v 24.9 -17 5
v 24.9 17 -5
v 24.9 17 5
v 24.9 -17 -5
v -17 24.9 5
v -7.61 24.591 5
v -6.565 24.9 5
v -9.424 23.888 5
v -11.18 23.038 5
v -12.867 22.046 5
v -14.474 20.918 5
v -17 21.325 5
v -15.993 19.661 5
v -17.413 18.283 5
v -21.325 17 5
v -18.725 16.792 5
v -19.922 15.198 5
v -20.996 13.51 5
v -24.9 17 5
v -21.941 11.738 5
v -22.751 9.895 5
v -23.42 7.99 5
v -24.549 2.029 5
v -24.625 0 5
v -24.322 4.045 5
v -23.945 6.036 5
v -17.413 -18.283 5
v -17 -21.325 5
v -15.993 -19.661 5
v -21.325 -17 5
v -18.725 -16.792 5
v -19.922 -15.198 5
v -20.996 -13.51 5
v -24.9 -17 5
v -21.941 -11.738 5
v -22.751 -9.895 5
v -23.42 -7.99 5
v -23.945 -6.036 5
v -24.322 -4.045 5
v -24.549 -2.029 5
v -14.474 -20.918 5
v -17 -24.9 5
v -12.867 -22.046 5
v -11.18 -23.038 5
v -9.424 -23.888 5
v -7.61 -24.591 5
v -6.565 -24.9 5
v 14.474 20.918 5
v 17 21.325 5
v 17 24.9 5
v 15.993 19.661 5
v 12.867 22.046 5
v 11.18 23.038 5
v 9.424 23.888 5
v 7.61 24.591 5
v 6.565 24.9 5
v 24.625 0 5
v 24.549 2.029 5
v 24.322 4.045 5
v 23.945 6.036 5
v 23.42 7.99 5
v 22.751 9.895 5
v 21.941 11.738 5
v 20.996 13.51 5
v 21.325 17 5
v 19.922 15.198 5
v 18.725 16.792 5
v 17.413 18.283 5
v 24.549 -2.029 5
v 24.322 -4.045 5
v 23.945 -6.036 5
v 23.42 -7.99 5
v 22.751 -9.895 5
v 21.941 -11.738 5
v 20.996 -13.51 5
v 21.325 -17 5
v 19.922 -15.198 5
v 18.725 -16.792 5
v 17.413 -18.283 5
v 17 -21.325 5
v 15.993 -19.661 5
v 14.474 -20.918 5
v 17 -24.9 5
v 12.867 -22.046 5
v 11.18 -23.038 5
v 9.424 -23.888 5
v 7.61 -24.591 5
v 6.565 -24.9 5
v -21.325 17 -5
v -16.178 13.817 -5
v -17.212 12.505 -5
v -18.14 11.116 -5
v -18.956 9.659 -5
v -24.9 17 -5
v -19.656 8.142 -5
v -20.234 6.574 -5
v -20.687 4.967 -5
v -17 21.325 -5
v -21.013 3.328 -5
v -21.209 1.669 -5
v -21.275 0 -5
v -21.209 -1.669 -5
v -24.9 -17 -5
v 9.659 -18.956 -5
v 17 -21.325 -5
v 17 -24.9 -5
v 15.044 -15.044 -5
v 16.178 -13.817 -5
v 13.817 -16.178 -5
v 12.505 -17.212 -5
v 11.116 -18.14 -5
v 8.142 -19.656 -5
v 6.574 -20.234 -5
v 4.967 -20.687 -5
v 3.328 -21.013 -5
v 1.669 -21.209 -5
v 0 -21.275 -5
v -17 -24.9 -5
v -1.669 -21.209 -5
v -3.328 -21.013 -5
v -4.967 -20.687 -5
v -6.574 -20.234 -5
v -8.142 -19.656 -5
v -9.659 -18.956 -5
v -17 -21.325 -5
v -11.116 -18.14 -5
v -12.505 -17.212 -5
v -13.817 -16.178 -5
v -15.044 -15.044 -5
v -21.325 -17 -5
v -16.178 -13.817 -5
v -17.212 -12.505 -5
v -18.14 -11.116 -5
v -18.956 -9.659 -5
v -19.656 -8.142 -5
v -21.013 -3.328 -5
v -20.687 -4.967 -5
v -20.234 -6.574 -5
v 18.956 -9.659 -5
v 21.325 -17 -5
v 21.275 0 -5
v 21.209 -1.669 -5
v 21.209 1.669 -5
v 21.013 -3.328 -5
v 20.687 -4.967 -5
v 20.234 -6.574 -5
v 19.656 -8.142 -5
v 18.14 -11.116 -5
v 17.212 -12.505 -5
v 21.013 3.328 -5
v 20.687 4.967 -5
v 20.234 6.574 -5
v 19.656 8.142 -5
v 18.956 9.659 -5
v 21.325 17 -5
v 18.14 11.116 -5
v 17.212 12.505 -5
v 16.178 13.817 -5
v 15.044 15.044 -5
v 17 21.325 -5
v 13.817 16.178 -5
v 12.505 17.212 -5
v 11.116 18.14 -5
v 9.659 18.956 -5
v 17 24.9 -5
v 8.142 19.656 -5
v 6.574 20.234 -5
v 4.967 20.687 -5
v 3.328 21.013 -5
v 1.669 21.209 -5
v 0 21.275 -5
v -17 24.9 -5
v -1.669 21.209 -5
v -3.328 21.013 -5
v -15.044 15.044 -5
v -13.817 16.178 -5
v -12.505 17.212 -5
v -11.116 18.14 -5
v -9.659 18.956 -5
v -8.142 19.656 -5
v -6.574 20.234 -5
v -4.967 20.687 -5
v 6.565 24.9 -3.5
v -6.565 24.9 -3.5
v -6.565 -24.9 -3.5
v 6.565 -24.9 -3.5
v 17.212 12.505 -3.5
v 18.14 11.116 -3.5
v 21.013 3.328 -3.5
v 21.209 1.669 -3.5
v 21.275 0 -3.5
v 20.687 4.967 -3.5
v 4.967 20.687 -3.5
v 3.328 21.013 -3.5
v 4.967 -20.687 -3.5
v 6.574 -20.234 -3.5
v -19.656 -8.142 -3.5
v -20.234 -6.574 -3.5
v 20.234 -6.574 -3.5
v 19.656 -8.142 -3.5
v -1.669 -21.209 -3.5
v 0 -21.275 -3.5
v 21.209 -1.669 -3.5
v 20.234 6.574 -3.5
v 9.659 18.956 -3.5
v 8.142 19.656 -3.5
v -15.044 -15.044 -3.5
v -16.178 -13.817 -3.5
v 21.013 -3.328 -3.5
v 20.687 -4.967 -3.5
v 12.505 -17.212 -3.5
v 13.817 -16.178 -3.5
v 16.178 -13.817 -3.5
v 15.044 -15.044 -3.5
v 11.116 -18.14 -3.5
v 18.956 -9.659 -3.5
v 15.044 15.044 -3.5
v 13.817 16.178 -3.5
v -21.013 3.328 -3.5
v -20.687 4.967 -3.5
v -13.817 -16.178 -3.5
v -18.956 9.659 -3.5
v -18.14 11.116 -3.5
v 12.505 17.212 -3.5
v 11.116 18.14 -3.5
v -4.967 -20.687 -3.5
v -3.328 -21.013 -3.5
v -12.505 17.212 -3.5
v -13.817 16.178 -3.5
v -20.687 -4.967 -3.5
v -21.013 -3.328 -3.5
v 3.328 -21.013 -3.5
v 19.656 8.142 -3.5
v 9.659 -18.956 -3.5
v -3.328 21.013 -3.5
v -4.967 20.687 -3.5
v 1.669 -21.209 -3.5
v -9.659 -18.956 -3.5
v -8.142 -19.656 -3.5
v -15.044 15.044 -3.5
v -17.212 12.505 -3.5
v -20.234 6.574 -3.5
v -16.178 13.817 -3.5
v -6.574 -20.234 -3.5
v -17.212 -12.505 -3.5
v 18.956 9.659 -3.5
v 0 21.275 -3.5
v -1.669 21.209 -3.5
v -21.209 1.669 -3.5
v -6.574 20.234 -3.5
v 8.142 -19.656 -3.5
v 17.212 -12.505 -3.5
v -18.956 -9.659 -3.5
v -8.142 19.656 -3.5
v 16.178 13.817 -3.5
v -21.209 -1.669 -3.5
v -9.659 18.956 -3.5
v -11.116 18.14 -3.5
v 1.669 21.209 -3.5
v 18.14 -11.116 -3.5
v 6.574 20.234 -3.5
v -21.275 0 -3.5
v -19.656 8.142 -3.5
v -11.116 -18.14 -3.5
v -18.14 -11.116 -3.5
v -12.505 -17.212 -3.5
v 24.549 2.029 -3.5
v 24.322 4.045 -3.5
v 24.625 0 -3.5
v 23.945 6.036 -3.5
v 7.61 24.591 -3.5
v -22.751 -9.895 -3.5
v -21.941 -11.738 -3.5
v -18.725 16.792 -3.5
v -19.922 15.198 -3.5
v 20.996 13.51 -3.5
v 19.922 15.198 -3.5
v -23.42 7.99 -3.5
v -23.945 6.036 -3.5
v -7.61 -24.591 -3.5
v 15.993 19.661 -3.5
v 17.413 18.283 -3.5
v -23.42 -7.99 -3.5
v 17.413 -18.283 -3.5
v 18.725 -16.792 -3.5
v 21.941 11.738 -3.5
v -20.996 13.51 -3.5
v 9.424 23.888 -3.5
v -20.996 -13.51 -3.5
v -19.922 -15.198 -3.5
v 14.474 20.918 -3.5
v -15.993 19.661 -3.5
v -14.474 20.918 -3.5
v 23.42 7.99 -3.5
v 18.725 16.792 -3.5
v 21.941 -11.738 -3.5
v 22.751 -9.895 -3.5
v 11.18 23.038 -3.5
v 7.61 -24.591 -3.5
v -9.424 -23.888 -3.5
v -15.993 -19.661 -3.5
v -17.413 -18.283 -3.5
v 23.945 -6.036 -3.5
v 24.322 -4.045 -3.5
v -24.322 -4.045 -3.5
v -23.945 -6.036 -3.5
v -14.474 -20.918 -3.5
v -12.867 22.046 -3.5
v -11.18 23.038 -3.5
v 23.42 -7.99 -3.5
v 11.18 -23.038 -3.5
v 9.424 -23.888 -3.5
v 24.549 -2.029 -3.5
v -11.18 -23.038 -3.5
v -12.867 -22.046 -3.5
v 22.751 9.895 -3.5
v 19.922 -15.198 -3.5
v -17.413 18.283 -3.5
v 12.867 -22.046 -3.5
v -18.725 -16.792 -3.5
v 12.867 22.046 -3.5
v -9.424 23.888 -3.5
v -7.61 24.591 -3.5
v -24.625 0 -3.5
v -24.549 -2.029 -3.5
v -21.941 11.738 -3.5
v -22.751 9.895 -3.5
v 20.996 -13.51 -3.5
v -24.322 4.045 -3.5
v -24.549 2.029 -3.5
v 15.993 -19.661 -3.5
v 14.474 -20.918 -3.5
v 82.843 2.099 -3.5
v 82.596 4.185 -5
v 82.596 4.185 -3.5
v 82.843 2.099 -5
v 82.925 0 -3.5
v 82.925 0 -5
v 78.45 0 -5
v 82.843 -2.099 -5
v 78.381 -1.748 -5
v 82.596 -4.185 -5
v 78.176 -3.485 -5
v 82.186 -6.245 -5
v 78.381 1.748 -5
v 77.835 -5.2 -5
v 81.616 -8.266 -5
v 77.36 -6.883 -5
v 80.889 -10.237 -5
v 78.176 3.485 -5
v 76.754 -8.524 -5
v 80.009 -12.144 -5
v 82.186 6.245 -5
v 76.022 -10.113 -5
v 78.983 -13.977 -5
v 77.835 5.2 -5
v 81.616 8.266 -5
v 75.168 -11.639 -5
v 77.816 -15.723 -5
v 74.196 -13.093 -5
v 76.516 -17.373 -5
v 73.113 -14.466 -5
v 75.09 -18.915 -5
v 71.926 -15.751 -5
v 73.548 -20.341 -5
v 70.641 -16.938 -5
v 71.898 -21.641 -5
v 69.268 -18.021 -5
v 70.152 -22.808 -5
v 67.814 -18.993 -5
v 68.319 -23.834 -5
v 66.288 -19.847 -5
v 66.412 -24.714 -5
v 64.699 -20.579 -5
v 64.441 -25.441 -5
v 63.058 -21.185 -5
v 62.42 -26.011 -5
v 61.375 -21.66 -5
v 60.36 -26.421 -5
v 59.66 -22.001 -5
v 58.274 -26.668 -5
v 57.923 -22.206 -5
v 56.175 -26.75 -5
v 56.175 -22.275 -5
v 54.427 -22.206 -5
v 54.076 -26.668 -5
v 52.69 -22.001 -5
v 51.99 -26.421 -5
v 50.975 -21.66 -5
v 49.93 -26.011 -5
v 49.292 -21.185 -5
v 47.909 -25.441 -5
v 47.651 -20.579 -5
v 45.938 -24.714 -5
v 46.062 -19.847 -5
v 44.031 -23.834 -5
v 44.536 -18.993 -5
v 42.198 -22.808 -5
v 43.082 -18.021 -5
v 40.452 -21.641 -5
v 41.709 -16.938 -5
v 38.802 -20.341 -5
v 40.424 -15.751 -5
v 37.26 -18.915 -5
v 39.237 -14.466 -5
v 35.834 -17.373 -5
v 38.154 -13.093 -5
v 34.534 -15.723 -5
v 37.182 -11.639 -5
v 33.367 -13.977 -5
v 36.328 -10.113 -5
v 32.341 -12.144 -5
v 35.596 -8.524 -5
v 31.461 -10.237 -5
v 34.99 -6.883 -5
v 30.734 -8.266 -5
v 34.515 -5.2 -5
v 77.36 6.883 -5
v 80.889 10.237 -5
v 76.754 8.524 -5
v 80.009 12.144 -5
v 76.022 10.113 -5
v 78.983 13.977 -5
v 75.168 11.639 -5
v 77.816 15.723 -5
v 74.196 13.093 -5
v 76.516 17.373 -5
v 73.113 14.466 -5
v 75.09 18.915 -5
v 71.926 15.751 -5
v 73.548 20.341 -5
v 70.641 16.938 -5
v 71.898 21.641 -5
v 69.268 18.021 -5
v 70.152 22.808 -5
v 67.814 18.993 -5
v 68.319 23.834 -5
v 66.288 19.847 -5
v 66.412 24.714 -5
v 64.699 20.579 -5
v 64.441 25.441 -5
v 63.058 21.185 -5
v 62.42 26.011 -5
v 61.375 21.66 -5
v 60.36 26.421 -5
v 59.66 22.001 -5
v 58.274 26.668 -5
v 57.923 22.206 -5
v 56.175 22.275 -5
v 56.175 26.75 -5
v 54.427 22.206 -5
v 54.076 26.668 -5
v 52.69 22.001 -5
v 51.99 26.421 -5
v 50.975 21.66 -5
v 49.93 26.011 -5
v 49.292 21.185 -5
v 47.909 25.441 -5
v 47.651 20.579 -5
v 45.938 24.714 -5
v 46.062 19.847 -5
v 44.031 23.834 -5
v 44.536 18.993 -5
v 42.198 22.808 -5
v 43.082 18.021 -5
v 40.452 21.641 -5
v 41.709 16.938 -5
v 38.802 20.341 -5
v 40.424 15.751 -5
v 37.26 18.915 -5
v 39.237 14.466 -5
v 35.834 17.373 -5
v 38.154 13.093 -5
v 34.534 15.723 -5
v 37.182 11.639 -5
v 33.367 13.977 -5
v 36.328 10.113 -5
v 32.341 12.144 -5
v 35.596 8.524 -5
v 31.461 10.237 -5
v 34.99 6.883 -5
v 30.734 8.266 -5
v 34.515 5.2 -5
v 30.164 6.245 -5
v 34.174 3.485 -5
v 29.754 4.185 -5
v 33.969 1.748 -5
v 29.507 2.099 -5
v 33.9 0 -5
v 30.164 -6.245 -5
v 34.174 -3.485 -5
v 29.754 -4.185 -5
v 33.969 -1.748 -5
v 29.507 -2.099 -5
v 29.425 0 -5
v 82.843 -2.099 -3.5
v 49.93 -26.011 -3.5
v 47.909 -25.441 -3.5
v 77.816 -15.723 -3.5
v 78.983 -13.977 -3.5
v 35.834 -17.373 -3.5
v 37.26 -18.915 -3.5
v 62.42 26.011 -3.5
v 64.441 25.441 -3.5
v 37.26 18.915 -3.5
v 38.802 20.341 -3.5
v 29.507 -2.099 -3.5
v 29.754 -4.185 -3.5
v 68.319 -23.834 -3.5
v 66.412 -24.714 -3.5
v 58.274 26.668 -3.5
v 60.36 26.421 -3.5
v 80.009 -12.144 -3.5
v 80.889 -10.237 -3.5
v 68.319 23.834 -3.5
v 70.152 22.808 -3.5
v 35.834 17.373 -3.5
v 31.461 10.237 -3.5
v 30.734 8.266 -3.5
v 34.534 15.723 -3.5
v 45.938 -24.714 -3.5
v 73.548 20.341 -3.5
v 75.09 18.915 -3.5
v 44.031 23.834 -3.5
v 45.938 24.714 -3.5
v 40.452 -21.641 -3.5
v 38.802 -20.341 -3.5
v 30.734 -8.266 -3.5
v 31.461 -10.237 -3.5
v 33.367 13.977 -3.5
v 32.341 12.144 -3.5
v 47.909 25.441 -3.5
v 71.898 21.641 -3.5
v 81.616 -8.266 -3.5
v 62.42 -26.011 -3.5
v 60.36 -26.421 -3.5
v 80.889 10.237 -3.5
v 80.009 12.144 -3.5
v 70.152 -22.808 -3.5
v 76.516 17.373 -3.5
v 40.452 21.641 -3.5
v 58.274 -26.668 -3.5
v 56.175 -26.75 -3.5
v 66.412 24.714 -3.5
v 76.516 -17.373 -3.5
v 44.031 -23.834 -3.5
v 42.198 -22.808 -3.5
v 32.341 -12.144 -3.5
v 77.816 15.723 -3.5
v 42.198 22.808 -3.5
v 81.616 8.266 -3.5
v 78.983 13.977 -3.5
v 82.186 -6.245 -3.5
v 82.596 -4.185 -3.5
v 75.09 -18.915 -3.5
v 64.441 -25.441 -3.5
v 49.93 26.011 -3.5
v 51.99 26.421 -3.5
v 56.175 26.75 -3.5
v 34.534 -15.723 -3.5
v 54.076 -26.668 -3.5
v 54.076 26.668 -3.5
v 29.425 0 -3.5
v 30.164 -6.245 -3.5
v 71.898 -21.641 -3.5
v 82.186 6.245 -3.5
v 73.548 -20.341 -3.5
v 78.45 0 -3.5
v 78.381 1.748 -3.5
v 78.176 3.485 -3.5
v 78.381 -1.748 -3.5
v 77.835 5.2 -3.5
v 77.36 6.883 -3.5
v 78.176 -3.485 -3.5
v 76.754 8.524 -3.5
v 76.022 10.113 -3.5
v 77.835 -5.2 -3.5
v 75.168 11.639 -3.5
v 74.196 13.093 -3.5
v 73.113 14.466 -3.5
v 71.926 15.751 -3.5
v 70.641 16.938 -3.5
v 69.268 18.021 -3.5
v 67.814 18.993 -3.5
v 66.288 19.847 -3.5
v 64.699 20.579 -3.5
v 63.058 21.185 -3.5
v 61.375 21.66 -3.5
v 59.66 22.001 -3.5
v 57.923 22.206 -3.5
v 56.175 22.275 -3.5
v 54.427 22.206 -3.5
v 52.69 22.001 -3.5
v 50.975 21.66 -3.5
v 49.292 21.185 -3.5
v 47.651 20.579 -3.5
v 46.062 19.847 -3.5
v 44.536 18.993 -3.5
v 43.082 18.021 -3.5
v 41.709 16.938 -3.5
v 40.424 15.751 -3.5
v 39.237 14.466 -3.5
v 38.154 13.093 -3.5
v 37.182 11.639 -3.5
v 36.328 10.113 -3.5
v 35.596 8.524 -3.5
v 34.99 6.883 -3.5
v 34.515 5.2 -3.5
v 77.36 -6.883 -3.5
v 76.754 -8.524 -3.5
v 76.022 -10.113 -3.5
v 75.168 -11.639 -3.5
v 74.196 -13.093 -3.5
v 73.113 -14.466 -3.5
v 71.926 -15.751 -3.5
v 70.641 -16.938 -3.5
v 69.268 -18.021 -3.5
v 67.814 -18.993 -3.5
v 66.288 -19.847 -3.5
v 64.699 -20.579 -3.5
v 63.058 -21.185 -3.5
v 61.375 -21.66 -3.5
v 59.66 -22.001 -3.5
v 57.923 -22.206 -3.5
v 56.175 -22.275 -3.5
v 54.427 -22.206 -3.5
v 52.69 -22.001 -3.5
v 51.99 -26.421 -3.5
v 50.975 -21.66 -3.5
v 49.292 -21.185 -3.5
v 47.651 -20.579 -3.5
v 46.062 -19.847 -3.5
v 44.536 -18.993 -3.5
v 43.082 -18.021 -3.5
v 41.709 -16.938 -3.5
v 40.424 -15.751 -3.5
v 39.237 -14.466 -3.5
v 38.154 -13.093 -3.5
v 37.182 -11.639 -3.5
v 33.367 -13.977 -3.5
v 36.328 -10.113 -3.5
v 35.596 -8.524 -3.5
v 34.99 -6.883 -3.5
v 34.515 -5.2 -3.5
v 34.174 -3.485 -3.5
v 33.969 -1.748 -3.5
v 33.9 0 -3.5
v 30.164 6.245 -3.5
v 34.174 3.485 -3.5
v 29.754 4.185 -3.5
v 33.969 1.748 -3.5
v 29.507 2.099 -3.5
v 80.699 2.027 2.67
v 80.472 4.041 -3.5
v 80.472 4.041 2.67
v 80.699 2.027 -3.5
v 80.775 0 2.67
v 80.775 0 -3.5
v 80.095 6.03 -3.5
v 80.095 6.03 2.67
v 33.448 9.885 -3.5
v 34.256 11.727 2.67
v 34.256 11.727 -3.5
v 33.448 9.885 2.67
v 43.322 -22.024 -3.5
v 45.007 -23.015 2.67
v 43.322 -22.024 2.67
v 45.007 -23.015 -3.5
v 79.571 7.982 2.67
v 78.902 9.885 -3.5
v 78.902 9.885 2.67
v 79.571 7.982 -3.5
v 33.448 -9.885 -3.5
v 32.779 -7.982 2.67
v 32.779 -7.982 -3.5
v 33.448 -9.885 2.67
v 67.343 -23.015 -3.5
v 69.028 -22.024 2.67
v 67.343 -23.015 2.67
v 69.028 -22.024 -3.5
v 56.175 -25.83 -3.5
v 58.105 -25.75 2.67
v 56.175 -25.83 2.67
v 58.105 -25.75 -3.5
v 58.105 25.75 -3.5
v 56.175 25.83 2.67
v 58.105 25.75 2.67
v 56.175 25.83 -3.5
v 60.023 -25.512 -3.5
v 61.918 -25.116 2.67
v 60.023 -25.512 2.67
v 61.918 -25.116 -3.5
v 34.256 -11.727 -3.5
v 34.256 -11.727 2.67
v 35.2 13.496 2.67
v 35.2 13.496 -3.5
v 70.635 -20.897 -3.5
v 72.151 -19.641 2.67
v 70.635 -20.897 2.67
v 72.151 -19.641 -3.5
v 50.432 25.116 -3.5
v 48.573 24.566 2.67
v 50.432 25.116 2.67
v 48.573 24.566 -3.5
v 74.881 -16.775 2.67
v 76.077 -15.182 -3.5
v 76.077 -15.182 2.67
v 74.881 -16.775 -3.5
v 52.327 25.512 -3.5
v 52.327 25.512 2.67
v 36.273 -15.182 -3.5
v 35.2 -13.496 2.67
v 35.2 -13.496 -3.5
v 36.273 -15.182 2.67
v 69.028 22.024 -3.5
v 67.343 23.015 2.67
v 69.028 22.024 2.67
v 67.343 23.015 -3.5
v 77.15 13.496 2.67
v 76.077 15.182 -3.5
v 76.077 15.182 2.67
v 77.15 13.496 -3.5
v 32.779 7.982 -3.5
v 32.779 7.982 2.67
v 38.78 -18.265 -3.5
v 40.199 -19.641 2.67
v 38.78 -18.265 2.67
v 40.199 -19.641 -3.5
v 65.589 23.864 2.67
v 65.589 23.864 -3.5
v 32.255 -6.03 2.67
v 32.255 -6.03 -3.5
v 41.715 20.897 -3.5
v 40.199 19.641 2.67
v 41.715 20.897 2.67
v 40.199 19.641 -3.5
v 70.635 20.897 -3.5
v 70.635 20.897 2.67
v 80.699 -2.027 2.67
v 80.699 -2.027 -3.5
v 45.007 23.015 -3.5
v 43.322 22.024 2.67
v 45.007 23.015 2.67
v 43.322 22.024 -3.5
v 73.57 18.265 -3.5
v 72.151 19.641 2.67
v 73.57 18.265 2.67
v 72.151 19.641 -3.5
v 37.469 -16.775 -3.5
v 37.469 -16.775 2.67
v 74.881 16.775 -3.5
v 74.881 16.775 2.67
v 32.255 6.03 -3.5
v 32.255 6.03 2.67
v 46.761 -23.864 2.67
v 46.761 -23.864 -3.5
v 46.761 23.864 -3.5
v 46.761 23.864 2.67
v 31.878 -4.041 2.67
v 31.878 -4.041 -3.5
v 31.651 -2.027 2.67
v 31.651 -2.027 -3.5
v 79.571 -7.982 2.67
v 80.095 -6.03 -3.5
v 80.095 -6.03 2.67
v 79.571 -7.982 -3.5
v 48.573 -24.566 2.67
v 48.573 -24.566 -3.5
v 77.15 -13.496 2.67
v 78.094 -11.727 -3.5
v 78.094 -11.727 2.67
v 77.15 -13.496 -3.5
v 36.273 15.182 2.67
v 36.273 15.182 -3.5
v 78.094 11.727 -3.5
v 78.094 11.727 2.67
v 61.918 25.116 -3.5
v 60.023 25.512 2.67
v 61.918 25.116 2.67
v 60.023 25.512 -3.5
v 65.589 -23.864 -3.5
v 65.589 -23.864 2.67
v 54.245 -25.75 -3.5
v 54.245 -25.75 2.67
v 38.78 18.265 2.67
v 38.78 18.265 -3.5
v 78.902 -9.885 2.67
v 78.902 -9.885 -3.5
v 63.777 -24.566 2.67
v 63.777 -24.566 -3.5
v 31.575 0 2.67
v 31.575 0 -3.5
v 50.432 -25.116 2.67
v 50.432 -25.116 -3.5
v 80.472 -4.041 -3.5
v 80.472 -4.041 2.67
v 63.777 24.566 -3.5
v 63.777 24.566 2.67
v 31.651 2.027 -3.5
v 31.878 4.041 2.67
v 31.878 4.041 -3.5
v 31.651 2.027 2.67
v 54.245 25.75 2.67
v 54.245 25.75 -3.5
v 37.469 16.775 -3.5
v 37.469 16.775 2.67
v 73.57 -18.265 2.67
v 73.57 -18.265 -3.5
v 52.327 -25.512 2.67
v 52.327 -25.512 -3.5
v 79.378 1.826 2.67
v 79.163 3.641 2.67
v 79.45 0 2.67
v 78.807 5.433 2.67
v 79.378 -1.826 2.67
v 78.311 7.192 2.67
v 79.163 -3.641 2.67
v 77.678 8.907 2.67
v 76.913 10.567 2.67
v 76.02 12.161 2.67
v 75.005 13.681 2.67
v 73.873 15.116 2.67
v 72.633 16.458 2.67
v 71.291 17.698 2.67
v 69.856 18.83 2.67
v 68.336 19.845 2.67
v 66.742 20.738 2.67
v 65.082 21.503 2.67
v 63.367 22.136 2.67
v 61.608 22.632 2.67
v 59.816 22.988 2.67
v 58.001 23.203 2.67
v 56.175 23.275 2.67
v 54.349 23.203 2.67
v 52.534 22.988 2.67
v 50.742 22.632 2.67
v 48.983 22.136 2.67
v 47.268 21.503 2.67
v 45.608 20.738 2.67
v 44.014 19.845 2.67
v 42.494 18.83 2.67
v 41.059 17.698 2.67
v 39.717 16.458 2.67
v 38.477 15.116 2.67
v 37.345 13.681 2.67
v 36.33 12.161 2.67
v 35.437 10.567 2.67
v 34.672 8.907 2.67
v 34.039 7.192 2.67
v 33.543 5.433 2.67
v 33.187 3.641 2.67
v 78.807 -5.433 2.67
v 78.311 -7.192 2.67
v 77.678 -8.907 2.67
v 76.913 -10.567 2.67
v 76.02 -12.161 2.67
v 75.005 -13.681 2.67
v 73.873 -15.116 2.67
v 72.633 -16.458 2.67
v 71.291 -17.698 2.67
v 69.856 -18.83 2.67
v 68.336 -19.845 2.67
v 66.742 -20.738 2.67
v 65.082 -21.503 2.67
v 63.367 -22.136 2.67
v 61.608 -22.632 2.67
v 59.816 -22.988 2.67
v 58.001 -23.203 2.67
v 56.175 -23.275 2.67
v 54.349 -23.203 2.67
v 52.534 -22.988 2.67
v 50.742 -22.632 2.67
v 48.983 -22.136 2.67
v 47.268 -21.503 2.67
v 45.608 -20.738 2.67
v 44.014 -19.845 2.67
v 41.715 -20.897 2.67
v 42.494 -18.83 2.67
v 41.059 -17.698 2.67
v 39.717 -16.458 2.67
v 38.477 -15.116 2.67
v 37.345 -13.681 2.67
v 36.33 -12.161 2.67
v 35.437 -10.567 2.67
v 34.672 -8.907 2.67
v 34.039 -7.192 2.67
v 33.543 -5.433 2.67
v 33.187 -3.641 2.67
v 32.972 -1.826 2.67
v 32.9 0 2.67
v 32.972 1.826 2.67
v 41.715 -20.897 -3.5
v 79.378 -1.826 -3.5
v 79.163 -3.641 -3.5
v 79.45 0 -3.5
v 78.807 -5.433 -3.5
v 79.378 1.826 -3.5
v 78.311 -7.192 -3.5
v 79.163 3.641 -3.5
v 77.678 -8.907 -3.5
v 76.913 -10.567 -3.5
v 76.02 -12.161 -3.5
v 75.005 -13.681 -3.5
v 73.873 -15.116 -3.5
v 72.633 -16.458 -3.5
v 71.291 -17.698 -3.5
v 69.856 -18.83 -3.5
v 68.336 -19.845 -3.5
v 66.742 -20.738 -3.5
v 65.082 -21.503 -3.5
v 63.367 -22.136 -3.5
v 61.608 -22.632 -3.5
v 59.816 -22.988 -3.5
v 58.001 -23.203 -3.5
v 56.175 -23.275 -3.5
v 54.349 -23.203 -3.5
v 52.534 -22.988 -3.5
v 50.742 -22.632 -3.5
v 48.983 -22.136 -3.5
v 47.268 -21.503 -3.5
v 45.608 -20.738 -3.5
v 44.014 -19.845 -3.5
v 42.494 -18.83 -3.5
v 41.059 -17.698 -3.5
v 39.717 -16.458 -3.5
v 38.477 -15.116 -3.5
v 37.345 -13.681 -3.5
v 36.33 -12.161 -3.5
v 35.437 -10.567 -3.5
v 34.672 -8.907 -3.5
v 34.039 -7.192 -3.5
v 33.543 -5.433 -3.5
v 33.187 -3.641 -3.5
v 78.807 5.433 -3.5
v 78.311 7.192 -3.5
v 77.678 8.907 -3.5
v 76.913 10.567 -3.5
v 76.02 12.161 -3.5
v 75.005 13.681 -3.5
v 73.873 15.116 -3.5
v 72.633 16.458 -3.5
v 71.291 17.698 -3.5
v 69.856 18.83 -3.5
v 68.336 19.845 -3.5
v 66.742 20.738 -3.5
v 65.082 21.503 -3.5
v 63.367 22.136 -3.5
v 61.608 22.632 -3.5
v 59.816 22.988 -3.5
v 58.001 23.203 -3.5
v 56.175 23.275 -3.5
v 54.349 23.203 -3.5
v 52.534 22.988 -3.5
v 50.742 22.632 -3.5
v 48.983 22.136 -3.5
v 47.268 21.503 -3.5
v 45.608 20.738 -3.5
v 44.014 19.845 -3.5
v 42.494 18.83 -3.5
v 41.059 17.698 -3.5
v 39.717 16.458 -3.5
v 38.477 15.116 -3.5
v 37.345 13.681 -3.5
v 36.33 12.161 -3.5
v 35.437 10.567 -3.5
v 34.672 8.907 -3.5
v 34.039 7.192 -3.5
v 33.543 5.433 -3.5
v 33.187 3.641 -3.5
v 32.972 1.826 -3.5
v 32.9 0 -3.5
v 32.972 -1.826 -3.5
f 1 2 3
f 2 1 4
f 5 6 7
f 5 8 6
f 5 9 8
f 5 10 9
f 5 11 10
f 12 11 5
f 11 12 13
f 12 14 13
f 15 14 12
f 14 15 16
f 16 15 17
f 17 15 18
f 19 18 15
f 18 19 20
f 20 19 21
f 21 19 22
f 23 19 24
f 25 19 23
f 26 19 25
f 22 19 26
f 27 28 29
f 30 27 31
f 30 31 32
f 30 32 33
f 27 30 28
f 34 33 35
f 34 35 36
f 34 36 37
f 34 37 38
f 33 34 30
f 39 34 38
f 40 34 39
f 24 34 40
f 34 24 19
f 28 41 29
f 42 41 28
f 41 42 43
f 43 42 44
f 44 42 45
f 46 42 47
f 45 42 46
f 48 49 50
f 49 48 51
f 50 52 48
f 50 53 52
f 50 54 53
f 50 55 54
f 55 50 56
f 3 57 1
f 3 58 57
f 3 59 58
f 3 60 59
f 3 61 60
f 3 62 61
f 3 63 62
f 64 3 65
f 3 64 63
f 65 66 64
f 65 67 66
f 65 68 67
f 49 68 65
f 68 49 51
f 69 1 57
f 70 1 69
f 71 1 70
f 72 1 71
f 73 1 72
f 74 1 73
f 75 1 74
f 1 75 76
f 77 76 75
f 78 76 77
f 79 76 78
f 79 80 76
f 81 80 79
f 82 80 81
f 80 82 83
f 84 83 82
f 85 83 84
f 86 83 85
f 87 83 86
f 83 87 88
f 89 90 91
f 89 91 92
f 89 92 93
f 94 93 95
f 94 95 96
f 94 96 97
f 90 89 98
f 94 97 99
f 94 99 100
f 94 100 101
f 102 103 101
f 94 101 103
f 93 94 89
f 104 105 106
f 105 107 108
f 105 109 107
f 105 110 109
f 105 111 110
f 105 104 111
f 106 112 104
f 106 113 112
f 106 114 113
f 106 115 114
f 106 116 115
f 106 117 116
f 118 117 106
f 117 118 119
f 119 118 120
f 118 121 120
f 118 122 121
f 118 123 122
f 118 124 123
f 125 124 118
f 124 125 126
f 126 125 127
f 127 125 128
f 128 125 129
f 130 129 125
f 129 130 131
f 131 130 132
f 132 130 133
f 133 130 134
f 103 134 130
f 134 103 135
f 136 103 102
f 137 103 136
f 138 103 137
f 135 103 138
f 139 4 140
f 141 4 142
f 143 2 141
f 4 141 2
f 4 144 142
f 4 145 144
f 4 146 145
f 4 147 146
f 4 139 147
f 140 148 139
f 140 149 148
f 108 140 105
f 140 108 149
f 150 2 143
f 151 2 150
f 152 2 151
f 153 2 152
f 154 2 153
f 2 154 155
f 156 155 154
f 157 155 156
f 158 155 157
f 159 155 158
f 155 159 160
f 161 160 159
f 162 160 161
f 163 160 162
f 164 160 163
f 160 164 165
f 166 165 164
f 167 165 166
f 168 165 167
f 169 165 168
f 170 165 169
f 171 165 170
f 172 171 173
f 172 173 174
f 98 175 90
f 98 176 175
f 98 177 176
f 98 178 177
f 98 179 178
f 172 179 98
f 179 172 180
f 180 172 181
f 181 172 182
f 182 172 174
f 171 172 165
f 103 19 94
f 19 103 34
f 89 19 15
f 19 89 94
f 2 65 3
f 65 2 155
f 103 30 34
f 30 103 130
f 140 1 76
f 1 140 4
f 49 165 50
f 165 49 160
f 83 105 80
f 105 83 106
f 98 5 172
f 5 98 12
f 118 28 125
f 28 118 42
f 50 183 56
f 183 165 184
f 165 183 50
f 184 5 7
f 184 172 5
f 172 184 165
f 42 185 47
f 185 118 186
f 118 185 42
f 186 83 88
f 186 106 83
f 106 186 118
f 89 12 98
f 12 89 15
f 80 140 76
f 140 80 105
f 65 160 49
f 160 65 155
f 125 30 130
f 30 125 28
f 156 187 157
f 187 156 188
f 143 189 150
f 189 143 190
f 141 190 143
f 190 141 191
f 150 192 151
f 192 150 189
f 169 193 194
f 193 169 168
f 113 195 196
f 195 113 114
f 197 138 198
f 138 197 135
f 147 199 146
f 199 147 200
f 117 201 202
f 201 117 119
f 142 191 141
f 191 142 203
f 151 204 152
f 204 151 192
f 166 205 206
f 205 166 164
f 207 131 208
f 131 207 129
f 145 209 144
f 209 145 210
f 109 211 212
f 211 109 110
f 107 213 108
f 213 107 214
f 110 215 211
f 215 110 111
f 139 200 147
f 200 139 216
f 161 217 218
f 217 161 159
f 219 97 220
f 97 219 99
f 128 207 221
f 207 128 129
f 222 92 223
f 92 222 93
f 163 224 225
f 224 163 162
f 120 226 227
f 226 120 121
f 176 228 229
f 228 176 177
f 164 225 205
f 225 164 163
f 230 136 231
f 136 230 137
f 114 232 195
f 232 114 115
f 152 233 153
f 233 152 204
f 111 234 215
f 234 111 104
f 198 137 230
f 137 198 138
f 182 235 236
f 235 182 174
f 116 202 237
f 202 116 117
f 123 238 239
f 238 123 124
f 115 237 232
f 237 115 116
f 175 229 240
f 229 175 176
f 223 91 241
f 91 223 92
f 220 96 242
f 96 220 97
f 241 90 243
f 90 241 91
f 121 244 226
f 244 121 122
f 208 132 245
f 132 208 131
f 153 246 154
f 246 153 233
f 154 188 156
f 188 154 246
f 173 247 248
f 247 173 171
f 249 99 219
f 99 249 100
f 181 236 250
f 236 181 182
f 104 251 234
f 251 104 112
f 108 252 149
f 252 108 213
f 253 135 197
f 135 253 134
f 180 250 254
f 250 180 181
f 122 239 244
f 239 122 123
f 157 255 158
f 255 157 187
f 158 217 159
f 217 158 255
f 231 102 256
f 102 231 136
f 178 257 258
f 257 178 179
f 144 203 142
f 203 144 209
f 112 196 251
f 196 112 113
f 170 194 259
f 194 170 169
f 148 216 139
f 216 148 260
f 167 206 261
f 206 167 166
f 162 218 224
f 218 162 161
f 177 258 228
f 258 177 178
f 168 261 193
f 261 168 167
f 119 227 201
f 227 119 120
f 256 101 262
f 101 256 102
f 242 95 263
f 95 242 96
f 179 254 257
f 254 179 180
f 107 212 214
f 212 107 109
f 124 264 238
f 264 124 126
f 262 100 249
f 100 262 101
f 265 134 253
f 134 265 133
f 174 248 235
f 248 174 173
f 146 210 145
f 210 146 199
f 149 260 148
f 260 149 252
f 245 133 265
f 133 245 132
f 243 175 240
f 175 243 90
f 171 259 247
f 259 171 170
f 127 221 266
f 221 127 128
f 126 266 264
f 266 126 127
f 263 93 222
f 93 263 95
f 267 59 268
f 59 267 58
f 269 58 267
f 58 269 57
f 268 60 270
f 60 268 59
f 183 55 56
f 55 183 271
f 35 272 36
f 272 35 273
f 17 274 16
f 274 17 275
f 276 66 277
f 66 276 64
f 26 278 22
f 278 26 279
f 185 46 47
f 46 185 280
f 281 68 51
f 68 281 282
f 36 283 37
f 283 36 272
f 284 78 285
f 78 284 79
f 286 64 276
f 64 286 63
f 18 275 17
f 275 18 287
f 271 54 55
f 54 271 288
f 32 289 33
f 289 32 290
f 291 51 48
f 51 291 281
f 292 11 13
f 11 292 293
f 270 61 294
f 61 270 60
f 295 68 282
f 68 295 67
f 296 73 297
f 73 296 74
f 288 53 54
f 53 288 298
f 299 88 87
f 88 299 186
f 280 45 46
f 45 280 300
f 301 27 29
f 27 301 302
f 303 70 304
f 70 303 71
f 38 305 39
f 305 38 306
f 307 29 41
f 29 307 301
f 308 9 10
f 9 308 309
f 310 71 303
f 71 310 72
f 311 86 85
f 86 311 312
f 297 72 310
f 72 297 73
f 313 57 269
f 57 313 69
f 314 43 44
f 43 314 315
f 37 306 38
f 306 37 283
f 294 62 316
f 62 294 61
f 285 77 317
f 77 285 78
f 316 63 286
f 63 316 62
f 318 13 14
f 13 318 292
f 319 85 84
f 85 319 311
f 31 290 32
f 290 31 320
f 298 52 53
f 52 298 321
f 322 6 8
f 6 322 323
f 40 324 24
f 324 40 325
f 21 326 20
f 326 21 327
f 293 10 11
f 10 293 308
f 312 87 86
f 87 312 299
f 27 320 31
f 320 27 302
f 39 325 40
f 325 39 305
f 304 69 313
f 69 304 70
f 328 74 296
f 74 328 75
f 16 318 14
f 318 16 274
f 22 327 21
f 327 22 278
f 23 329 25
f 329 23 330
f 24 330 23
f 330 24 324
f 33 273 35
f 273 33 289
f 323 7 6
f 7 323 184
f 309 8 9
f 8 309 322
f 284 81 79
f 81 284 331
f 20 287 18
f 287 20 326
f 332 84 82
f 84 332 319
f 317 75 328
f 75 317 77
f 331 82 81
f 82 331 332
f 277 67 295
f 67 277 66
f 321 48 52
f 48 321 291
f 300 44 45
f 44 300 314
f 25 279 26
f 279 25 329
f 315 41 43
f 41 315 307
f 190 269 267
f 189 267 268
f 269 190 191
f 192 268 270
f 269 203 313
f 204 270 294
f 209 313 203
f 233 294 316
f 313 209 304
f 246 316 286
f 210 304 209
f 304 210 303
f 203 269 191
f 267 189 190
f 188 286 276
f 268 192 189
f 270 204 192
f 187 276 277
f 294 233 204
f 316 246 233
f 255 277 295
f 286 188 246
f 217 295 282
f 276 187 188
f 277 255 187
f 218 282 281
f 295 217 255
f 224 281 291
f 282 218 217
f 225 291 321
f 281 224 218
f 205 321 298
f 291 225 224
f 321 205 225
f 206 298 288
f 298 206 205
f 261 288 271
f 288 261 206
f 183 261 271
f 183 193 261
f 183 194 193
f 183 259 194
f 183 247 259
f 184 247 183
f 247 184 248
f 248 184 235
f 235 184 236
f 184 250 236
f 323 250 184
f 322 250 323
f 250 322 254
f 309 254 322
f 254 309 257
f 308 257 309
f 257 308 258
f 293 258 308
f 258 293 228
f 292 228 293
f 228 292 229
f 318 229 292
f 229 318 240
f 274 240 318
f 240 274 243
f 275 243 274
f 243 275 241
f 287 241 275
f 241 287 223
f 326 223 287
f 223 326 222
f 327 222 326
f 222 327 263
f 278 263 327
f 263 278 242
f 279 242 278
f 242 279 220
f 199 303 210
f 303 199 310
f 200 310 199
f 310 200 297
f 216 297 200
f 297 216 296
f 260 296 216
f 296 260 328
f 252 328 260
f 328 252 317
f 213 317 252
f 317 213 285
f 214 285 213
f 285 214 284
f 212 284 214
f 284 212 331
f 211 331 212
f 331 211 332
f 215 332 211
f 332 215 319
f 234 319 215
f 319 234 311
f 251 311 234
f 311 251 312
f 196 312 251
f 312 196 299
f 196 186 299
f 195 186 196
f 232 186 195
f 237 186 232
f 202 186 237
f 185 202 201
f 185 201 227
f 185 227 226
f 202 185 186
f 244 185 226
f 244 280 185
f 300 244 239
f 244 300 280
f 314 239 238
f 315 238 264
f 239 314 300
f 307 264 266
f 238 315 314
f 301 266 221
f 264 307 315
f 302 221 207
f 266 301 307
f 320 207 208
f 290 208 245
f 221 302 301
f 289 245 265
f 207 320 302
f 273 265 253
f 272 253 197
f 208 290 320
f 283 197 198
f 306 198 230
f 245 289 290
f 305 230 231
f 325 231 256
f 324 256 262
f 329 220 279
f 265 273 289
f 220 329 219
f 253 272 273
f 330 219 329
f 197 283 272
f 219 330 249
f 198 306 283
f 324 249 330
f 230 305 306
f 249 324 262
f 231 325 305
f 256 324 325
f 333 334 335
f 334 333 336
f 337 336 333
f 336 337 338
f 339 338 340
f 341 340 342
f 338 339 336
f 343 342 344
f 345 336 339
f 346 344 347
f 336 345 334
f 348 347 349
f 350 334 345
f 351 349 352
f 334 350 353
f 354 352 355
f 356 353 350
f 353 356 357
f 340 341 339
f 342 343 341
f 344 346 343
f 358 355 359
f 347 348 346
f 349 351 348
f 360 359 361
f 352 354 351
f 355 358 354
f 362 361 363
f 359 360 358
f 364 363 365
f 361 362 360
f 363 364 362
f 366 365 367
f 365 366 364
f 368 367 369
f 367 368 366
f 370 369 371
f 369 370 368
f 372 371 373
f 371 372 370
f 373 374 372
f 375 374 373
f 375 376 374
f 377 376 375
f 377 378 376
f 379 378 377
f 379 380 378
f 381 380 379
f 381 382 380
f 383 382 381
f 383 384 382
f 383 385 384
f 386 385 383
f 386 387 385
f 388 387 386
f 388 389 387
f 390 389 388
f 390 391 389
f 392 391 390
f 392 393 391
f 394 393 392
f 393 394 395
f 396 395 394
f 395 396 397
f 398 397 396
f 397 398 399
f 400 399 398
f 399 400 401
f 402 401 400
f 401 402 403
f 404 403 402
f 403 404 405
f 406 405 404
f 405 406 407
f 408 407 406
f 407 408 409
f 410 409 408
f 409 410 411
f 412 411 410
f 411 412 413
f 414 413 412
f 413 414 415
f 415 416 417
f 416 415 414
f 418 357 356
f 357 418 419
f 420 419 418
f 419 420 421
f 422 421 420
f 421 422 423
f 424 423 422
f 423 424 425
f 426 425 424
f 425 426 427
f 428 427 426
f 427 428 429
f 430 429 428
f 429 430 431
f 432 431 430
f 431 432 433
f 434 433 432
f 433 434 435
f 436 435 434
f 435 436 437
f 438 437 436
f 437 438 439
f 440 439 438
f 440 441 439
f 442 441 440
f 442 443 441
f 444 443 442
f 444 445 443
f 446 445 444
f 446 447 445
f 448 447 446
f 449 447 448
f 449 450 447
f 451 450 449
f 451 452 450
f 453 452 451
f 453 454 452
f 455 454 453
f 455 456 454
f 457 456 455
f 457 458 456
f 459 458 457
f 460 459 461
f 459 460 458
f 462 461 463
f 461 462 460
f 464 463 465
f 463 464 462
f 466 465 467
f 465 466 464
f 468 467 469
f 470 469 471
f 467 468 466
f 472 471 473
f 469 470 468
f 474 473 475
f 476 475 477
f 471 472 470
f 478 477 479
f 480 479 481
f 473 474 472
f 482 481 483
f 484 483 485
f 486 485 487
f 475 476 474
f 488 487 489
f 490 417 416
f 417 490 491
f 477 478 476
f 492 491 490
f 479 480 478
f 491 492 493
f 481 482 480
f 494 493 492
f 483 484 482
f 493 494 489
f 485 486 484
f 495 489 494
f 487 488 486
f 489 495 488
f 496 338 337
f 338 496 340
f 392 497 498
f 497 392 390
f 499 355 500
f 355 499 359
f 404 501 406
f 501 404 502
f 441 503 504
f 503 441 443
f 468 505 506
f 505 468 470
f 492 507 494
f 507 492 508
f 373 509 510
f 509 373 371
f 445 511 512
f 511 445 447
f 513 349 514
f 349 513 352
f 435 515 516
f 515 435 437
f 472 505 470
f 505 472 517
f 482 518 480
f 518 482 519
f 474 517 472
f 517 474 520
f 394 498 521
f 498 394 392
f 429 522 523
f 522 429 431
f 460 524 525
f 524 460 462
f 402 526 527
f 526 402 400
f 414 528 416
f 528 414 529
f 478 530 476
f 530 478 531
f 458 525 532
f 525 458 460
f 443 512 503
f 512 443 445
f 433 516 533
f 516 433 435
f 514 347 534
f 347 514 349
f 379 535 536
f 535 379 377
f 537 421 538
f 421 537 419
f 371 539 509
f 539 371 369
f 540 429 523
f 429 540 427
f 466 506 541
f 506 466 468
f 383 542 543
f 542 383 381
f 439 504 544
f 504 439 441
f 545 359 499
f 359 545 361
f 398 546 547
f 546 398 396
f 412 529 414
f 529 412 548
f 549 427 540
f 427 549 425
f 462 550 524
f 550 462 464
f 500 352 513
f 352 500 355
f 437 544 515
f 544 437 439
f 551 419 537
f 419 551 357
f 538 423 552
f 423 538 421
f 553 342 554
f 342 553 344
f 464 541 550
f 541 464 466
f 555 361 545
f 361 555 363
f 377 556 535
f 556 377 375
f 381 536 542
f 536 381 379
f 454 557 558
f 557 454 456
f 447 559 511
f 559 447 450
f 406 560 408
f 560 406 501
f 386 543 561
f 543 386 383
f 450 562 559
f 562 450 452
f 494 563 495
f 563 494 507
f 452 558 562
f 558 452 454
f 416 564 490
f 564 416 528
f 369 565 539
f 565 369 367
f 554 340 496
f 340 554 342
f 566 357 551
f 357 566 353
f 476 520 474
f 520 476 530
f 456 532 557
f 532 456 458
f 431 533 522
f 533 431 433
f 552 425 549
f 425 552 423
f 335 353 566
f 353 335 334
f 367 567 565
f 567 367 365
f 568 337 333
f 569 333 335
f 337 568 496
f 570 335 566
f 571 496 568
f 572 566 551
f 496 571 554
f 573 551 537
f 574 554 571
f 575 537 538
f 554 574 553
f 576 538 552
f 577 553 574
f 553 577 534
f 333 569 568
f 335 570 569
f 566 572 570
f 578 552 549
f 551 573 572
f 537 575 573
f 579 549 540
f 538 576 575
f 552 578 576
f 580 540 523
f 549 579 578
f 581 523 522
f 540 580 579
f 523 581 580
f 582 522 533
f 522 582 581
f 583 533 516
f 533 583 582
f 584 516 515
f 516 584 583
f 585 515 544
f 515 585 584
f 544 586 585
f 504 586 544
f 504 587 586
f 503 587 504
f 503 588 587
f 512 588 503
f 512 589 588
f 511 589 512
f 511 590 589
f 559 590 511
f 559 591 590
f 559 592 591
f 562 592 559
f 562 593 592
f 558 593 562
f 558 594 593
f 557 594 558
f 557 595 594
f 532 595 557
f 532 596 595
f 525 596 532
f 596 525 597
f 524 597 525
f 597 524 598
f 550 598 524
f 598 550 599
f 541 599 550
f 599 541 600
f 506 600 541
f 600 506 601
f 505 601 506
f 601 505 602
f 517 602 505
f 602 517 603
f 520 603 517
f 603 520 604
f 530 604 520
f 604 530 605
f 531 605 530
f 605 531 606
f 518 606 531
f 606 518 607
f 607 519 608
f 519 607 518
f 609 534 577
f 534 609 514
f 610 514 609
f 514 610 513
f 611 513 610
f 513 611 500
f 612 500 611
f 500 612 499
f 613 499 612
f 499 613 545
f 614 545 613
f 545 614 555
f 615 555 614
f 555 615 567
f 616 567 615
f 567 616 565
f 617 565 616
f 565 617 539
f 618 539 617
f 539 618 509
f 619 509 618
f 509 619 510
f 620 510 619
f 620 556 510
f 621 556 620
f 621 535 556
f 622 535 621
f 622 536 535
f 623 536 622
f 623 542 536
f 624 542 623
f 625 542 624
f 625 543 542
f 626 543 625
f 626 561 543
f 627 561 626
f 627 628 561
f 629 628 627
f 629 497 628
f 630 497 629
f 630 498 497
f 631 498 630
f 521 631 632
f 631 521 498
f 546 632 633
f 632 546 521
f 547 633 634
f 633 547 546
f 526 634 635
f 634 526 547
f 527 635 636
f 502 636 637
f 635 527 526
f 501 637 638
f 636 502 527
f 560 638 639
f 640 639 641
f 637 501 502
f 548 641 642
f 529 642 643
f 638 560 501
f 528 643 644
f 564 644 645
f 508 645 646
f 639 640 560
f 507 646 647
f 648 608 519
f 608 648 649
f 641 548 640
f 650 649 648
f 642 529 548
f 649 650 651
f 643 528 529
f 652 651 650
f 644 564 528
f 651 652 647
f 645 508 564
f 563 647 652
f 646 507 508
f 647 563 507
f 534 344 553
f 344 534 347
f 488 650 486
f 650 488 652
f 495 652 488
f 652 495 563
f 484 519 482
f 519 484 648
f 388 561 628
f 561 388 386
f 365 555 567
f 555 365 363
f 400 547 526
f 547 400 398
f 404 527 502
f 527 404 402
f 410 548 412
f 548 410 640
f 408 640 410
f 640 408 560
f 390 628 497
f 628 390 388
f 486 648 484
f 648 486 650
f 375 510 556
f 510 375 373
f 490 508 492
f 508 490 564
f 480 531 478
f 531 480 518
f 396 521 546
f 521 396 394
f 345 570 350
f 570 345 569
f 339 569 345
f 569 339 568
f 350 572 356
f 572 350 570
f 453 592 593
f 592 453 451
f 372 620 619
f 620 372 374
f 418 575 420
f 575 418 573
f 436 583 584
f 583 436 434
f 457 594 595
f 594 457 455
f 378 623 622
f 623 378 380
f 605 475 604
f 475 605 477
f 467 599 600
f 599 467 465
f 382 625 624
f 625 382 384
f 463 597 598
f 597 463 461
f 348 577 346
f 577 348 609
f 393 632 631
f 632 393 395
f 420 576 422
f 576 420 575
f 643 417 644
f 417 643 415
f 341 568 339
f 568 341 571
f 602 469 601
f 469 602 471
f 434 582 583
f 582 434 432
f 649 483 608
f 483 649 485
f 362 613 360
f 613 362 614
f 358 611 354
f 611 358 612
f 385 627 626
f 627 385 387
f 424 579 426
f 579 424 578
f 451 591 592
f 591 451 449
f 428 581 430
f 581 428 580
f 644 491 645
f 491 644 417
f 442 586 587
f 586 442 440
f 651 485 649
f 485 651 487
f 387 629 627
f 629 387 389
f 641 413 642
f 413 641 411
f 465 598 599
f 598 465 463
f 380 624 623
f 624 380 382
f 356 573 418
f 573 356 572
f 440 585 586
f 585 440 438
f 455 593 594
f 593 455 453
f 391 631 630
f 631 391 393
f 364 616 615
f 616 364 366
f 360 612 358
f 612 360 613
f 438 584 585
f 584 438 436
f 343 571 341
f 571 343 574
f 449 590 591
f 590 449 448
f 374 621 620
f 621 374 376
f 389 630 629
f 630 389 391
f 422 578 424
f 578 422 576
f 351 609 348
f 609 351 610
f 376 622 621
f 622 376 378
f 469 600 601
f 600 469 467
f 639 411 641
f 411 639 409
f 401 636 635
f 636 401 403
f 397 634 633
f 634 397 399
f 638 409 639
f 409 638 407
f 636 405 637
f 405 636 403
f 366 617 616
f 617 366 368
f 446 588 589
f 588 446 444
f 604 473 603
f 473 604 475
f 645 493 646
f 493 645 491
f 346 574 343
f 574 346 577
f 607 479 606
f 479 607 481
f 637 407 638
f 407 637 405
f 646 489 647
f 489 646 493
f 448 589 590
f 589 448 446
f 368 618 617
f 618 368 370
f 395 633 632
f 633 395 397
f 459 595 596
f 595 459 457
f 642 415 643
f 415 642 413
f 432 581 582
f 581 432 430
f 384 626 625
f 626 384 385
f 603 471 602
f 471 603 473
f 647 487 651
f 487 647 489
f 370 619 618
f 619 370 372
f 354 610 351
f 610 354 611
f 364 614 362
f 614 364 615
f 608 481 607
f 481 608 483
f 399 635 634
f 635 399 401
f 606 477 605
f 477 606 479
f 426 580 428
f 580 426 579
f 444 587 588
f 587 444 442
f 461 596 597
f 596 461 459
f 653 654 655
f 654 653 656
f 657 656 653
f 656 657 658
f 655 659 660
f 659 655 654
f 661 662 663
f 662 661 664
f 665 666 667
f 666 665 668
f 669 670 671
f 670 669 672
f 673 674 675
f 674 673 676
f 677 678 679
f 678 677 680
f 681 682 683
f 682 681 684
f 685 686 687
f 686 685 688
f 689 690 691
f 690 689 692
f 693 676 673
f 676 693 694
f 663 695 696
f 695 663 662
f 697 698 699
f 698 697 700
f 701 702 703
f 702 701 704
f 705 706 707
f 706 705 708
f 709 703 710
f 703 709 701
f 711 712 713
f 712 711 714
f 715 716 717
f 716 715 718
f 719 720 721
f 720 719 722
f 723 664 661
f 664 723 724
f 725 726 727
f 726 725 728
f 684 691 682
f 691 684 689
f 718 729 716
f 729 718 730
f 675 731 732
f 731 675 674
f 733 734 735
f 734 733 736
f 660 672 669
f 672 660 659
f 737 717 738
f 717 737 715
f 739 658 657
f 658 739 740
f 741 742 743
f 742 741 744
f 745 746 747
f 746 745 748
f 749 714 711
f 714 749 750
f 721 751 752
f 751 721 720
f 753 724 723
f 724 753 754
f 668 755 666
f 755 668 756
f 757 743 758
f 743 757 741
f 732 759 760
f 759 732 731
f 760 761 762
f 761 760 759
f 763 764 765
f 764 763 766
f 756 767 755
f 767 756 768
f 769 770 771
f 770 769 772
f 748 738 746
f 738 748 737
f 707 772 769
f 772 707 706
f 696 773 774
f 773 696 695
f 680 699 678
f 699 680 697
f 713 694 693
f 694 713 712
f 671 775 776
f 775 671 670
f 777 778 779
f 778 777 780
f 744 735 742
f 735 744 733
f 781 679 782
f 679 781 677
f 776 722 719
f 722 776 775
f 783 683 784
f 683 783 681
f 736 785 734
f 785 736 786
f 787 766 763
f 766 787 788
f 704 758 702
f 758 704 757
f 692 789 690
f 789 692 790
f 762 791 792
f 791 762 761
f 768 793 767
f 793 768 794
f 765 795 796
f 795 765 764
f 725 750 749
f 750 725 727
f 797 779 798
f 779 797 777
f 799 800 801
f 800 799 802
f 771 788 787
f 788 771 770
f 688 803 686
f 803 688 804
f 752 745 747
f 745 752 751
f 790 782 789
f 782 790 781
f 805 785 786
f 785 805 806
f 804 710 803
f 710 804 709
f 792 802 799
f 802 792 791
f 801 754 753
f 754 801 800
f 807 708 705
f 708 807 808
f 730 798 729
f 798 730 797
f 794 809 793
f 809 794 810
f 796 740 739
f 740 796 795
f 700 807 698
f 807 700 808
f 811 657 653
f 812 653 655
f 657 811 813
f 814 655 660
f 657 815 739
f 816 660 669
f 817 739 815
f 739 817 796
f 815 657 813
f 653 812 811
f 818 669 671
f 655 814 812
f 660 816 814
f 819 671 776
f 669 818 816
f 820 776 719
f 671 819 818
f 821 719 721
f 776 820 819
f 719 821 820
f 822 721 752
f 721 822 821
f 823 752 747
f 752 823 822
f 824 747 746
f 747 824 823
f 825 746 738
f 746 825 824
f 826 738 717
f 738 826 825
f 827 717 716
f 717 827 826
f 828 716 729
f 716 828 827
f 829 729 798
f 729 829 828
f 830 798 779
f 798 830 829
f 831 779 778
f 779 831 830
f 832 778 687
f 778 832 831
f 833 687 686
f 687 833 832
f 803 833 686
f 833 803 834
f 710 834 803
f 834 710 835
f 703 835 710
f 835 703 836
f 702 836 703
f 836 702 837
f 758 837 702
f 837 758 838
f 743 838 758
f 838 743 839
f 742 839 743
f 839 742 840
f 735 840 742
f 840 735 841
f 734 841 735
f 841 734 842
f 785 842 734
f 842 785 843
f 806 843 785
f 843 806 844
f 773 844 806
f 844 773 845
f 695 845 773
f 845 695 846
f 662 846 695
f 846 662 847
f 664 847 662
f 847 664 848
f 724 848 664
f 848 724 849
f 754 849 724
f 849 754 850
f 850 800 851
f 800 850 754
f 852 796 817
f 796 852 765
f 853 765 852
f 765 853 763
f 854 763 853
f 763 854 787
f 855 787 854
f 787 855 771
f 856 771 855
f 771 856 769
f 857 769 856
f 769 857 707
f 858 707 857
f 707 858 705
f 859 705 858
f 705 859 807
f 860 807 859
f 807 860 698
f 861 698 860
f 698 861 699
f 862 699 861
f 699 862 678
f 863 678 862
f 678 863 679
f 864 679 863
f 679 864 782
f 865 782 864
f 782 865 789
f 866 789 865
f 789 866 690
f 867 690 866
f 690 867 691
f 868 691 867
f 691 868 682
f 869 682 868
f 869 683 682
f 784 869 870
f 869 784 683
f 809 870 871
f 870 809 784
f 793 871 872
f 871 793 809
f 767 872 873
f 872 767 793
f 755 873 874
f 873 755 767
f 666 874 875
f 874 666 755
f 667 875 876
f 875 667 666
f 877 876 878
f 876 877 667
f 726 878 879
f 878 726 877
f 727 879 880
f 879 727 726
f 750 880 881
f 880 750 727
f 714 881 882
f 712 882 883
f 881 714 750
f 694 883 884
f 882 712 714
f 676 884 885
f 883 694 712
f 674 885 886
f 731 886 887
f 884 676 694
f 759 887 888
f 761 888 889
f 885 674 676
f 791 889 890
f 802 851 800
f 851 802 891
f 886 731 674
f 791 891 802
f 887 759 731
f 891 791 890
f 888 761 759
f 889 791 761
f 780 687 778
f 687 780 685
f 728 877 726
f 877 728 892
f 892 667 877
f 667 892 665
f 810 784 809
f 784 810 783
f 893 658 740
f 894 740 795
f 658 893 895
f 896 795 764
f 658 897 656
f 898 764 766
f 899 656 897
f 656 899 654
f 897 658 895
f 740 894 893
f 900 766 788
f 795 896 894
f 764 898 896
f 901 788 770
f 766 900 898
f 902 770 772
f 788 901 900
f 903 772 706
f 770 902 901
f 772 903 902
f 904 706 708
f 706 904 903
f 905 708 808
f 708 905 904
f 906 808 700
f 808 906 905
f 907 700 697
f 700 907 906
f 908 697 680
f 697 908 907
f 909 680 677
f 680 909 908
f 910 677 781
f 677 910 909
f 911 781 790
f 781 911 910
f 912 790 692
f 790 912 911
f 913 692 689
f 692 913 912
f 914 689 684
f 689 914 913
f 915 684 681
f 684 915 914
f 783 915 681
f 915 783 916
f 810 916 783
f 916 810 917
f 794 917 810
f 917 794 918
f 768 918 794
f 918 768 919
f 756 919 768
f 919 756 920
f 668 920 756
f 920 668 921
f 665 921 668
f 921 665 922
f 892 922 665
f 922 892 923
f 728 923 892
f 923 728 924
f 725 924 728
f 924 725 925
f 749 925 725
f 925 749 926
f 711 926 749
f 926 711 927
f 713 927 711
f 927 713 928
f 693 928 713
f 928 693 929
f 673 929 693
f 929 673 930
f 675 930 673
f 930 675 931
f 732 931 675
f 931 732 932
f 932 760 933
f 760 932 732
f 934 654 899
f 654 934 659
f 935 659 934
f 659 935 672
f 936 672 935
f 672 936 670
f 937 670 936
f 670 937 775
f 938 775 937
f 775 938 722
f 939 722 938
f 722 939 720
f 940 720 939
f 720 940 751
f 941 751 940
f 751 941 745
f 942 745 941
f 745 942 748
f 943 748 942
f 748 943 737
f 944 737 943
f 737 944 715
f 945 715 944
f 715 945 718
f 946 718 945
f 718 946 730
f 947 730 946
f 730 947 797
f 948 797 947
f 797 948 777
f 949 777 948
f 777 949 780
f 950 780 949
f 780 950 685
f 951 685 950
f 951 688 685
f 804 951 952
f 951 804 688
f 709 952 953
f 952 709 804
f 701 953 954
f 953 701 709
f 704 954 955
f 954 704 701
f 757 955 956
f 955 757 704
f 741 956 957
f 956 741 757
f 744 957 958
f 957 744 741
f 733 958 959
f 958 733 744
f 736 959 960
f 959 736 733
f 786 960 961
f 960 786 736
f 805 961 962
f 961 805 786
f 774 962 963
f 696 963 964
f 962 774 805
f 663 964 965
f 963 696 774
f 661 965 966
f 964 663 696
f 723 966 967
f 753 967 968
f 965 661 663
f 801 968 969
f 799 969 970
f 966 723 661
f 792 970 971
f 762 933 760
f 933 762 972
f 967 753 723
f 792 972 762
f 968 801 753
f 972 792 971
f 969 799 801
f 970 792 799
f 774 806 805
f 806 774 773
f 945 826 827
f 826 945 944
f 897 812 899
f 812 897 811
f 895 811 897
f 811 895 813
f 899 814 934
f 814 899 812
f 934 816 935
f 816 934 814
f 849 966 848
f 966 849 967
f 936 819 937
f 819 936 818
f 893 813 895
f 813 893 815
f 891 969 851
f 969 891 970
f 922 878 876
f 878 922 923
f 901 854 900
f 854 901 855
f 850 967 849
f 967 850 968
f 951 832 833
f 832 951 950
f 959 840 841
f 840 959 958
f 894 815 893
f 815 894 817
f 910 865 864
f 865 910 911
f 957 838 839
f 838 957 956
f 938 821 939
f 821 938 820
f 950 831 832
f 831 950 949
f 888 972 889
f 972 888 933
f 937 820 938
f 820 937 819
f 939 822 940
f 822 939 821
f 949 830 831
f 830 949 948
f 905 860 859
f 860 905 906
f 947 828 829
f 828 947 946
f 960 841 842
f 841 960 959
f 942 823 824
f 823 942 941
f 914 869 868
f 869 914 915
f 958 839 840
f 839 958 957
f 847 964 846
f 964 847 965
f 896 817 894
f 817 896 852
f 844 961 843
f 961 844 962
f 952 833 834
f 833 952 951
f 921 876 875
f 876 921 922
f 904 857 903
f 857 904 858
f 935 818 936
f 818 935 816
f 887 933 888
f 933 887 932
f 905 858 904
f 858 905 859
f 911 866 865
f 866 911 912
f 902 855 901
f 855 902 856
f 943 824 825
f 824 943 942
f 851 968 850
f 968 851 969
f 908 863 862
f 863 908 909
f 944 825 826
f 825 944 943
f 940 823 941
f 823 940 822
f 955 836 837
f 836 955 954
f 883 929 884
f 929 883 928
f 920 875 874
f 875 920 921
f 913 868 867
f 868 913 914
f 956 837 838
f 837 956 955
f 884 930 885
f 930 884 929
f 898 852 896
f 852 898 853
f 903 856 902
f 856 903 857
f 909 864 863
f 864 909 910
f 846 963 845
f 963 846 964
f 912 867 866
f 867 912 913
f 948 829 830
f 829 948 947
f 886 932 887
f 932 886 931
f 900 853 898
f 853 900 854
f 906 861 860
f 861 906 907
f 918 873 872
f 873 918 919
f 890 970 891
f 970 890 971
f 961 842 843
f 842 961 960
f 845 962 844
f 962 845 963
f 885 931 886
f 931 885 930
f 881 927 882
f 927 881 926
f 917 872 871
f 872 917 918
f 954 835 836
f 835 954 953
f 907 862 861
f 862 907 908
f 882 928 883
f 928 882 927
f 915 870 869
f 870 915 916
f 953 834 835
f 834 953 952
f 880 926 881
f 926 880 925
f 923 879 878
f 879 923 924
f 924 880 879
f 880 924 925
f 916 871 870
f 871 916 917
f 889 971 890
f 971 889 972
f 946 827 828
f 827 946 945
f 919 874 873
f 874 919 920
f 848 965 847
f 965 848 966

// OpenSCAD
//Cube insert: Lens holder with clamp - for lenses with big diameter

/* [User Parameters] */
//Lens diameter - measure the diameter of your lens carefully and insert the value in millimetres. The holder can be used for lenses with a diameter from 42 mm to 50 mm.
lens_diameter = 48.55; //[40:0.01:50]
//Edge thickness - measure the thickness of your lens as close to the outer edge as possible.
lens_edge_thickness = 2.33; //[0.5:0.01:10]
// Which part would you like to print?
part = "first"; // [first:Both - Holder AND Clamp,second:Holder ONLY,third:Clamp ONLY]
// Is this insert for a 3D printed cube or for a cube produced by injection molding?
3D_printed_cube = "IM"; // [IM, 3Dprint]

/* [Hiden] */
$fn = 80;
eps = .002;
a = 49.8;
b = 33.6;
c = 6.28;
d = 53.8;
h = lens_edge_thickness < 4.1 ? 10 : lens_edge_thickness+6; //holder height
h1 = h - 1.5 - lens_edge_thickness; //clamp rims height
t = 1.5; //clamp ring thickness
IM_offset = 3D_printed_cube == "3Dprint" ? 0 : 0.2;

print_part();

module print_part() {   //choose part to print holder/clamp/both
	if (part == "first") {
		lens_holder();
        lens_clamp();
	} else if (part == "second") {
		lens_holder();
	} else if (part == "third") {
		lens_clamp();
	} 
}
module lens_holder () {
    difference(){
        union() {   //basic insert design
            cube([a,b+2*IM_offset,h], center=true);
            cube([b+2*IM_offset,a,h], center=true);
            rotate(a=[0,0,45]){
                cube([c,d+2*IM_offset,h], center=true);
            }
            rotate(a=[0,0,-45]){
                cube([c,d+2*IM_offset,h], center=true);
            }
        }
        union() {
            cylinder(h+eps,d=lens_diameter-6, center = true); //hole
            translate([0,0,1.5]){
                scale([1,1.05,1])cylinder(h,d=lens_diameter+0.7, center = true); //rim to hold the lens
            }
        }
    } 
}

module lens_clamp() {
    translate([a/2+lens_diameter/2+7,0,-(h-t)/2]){
        difference(){   //bottom ring
            cylinder(t, d=53.5, center = true);
            cylinder(t+eps, d=lens_diameter-4, center = true);
        }
        translate([0,0,+(h1+t)/2]){
            difference(){   //rim
                scale([1,1.05,1])cylinder(h1,d=lens_diameter+0.65, center = true);
                cylinder(h1+eps,d=lens_diameter-2, center = true);
            }
            }
        }
    }
